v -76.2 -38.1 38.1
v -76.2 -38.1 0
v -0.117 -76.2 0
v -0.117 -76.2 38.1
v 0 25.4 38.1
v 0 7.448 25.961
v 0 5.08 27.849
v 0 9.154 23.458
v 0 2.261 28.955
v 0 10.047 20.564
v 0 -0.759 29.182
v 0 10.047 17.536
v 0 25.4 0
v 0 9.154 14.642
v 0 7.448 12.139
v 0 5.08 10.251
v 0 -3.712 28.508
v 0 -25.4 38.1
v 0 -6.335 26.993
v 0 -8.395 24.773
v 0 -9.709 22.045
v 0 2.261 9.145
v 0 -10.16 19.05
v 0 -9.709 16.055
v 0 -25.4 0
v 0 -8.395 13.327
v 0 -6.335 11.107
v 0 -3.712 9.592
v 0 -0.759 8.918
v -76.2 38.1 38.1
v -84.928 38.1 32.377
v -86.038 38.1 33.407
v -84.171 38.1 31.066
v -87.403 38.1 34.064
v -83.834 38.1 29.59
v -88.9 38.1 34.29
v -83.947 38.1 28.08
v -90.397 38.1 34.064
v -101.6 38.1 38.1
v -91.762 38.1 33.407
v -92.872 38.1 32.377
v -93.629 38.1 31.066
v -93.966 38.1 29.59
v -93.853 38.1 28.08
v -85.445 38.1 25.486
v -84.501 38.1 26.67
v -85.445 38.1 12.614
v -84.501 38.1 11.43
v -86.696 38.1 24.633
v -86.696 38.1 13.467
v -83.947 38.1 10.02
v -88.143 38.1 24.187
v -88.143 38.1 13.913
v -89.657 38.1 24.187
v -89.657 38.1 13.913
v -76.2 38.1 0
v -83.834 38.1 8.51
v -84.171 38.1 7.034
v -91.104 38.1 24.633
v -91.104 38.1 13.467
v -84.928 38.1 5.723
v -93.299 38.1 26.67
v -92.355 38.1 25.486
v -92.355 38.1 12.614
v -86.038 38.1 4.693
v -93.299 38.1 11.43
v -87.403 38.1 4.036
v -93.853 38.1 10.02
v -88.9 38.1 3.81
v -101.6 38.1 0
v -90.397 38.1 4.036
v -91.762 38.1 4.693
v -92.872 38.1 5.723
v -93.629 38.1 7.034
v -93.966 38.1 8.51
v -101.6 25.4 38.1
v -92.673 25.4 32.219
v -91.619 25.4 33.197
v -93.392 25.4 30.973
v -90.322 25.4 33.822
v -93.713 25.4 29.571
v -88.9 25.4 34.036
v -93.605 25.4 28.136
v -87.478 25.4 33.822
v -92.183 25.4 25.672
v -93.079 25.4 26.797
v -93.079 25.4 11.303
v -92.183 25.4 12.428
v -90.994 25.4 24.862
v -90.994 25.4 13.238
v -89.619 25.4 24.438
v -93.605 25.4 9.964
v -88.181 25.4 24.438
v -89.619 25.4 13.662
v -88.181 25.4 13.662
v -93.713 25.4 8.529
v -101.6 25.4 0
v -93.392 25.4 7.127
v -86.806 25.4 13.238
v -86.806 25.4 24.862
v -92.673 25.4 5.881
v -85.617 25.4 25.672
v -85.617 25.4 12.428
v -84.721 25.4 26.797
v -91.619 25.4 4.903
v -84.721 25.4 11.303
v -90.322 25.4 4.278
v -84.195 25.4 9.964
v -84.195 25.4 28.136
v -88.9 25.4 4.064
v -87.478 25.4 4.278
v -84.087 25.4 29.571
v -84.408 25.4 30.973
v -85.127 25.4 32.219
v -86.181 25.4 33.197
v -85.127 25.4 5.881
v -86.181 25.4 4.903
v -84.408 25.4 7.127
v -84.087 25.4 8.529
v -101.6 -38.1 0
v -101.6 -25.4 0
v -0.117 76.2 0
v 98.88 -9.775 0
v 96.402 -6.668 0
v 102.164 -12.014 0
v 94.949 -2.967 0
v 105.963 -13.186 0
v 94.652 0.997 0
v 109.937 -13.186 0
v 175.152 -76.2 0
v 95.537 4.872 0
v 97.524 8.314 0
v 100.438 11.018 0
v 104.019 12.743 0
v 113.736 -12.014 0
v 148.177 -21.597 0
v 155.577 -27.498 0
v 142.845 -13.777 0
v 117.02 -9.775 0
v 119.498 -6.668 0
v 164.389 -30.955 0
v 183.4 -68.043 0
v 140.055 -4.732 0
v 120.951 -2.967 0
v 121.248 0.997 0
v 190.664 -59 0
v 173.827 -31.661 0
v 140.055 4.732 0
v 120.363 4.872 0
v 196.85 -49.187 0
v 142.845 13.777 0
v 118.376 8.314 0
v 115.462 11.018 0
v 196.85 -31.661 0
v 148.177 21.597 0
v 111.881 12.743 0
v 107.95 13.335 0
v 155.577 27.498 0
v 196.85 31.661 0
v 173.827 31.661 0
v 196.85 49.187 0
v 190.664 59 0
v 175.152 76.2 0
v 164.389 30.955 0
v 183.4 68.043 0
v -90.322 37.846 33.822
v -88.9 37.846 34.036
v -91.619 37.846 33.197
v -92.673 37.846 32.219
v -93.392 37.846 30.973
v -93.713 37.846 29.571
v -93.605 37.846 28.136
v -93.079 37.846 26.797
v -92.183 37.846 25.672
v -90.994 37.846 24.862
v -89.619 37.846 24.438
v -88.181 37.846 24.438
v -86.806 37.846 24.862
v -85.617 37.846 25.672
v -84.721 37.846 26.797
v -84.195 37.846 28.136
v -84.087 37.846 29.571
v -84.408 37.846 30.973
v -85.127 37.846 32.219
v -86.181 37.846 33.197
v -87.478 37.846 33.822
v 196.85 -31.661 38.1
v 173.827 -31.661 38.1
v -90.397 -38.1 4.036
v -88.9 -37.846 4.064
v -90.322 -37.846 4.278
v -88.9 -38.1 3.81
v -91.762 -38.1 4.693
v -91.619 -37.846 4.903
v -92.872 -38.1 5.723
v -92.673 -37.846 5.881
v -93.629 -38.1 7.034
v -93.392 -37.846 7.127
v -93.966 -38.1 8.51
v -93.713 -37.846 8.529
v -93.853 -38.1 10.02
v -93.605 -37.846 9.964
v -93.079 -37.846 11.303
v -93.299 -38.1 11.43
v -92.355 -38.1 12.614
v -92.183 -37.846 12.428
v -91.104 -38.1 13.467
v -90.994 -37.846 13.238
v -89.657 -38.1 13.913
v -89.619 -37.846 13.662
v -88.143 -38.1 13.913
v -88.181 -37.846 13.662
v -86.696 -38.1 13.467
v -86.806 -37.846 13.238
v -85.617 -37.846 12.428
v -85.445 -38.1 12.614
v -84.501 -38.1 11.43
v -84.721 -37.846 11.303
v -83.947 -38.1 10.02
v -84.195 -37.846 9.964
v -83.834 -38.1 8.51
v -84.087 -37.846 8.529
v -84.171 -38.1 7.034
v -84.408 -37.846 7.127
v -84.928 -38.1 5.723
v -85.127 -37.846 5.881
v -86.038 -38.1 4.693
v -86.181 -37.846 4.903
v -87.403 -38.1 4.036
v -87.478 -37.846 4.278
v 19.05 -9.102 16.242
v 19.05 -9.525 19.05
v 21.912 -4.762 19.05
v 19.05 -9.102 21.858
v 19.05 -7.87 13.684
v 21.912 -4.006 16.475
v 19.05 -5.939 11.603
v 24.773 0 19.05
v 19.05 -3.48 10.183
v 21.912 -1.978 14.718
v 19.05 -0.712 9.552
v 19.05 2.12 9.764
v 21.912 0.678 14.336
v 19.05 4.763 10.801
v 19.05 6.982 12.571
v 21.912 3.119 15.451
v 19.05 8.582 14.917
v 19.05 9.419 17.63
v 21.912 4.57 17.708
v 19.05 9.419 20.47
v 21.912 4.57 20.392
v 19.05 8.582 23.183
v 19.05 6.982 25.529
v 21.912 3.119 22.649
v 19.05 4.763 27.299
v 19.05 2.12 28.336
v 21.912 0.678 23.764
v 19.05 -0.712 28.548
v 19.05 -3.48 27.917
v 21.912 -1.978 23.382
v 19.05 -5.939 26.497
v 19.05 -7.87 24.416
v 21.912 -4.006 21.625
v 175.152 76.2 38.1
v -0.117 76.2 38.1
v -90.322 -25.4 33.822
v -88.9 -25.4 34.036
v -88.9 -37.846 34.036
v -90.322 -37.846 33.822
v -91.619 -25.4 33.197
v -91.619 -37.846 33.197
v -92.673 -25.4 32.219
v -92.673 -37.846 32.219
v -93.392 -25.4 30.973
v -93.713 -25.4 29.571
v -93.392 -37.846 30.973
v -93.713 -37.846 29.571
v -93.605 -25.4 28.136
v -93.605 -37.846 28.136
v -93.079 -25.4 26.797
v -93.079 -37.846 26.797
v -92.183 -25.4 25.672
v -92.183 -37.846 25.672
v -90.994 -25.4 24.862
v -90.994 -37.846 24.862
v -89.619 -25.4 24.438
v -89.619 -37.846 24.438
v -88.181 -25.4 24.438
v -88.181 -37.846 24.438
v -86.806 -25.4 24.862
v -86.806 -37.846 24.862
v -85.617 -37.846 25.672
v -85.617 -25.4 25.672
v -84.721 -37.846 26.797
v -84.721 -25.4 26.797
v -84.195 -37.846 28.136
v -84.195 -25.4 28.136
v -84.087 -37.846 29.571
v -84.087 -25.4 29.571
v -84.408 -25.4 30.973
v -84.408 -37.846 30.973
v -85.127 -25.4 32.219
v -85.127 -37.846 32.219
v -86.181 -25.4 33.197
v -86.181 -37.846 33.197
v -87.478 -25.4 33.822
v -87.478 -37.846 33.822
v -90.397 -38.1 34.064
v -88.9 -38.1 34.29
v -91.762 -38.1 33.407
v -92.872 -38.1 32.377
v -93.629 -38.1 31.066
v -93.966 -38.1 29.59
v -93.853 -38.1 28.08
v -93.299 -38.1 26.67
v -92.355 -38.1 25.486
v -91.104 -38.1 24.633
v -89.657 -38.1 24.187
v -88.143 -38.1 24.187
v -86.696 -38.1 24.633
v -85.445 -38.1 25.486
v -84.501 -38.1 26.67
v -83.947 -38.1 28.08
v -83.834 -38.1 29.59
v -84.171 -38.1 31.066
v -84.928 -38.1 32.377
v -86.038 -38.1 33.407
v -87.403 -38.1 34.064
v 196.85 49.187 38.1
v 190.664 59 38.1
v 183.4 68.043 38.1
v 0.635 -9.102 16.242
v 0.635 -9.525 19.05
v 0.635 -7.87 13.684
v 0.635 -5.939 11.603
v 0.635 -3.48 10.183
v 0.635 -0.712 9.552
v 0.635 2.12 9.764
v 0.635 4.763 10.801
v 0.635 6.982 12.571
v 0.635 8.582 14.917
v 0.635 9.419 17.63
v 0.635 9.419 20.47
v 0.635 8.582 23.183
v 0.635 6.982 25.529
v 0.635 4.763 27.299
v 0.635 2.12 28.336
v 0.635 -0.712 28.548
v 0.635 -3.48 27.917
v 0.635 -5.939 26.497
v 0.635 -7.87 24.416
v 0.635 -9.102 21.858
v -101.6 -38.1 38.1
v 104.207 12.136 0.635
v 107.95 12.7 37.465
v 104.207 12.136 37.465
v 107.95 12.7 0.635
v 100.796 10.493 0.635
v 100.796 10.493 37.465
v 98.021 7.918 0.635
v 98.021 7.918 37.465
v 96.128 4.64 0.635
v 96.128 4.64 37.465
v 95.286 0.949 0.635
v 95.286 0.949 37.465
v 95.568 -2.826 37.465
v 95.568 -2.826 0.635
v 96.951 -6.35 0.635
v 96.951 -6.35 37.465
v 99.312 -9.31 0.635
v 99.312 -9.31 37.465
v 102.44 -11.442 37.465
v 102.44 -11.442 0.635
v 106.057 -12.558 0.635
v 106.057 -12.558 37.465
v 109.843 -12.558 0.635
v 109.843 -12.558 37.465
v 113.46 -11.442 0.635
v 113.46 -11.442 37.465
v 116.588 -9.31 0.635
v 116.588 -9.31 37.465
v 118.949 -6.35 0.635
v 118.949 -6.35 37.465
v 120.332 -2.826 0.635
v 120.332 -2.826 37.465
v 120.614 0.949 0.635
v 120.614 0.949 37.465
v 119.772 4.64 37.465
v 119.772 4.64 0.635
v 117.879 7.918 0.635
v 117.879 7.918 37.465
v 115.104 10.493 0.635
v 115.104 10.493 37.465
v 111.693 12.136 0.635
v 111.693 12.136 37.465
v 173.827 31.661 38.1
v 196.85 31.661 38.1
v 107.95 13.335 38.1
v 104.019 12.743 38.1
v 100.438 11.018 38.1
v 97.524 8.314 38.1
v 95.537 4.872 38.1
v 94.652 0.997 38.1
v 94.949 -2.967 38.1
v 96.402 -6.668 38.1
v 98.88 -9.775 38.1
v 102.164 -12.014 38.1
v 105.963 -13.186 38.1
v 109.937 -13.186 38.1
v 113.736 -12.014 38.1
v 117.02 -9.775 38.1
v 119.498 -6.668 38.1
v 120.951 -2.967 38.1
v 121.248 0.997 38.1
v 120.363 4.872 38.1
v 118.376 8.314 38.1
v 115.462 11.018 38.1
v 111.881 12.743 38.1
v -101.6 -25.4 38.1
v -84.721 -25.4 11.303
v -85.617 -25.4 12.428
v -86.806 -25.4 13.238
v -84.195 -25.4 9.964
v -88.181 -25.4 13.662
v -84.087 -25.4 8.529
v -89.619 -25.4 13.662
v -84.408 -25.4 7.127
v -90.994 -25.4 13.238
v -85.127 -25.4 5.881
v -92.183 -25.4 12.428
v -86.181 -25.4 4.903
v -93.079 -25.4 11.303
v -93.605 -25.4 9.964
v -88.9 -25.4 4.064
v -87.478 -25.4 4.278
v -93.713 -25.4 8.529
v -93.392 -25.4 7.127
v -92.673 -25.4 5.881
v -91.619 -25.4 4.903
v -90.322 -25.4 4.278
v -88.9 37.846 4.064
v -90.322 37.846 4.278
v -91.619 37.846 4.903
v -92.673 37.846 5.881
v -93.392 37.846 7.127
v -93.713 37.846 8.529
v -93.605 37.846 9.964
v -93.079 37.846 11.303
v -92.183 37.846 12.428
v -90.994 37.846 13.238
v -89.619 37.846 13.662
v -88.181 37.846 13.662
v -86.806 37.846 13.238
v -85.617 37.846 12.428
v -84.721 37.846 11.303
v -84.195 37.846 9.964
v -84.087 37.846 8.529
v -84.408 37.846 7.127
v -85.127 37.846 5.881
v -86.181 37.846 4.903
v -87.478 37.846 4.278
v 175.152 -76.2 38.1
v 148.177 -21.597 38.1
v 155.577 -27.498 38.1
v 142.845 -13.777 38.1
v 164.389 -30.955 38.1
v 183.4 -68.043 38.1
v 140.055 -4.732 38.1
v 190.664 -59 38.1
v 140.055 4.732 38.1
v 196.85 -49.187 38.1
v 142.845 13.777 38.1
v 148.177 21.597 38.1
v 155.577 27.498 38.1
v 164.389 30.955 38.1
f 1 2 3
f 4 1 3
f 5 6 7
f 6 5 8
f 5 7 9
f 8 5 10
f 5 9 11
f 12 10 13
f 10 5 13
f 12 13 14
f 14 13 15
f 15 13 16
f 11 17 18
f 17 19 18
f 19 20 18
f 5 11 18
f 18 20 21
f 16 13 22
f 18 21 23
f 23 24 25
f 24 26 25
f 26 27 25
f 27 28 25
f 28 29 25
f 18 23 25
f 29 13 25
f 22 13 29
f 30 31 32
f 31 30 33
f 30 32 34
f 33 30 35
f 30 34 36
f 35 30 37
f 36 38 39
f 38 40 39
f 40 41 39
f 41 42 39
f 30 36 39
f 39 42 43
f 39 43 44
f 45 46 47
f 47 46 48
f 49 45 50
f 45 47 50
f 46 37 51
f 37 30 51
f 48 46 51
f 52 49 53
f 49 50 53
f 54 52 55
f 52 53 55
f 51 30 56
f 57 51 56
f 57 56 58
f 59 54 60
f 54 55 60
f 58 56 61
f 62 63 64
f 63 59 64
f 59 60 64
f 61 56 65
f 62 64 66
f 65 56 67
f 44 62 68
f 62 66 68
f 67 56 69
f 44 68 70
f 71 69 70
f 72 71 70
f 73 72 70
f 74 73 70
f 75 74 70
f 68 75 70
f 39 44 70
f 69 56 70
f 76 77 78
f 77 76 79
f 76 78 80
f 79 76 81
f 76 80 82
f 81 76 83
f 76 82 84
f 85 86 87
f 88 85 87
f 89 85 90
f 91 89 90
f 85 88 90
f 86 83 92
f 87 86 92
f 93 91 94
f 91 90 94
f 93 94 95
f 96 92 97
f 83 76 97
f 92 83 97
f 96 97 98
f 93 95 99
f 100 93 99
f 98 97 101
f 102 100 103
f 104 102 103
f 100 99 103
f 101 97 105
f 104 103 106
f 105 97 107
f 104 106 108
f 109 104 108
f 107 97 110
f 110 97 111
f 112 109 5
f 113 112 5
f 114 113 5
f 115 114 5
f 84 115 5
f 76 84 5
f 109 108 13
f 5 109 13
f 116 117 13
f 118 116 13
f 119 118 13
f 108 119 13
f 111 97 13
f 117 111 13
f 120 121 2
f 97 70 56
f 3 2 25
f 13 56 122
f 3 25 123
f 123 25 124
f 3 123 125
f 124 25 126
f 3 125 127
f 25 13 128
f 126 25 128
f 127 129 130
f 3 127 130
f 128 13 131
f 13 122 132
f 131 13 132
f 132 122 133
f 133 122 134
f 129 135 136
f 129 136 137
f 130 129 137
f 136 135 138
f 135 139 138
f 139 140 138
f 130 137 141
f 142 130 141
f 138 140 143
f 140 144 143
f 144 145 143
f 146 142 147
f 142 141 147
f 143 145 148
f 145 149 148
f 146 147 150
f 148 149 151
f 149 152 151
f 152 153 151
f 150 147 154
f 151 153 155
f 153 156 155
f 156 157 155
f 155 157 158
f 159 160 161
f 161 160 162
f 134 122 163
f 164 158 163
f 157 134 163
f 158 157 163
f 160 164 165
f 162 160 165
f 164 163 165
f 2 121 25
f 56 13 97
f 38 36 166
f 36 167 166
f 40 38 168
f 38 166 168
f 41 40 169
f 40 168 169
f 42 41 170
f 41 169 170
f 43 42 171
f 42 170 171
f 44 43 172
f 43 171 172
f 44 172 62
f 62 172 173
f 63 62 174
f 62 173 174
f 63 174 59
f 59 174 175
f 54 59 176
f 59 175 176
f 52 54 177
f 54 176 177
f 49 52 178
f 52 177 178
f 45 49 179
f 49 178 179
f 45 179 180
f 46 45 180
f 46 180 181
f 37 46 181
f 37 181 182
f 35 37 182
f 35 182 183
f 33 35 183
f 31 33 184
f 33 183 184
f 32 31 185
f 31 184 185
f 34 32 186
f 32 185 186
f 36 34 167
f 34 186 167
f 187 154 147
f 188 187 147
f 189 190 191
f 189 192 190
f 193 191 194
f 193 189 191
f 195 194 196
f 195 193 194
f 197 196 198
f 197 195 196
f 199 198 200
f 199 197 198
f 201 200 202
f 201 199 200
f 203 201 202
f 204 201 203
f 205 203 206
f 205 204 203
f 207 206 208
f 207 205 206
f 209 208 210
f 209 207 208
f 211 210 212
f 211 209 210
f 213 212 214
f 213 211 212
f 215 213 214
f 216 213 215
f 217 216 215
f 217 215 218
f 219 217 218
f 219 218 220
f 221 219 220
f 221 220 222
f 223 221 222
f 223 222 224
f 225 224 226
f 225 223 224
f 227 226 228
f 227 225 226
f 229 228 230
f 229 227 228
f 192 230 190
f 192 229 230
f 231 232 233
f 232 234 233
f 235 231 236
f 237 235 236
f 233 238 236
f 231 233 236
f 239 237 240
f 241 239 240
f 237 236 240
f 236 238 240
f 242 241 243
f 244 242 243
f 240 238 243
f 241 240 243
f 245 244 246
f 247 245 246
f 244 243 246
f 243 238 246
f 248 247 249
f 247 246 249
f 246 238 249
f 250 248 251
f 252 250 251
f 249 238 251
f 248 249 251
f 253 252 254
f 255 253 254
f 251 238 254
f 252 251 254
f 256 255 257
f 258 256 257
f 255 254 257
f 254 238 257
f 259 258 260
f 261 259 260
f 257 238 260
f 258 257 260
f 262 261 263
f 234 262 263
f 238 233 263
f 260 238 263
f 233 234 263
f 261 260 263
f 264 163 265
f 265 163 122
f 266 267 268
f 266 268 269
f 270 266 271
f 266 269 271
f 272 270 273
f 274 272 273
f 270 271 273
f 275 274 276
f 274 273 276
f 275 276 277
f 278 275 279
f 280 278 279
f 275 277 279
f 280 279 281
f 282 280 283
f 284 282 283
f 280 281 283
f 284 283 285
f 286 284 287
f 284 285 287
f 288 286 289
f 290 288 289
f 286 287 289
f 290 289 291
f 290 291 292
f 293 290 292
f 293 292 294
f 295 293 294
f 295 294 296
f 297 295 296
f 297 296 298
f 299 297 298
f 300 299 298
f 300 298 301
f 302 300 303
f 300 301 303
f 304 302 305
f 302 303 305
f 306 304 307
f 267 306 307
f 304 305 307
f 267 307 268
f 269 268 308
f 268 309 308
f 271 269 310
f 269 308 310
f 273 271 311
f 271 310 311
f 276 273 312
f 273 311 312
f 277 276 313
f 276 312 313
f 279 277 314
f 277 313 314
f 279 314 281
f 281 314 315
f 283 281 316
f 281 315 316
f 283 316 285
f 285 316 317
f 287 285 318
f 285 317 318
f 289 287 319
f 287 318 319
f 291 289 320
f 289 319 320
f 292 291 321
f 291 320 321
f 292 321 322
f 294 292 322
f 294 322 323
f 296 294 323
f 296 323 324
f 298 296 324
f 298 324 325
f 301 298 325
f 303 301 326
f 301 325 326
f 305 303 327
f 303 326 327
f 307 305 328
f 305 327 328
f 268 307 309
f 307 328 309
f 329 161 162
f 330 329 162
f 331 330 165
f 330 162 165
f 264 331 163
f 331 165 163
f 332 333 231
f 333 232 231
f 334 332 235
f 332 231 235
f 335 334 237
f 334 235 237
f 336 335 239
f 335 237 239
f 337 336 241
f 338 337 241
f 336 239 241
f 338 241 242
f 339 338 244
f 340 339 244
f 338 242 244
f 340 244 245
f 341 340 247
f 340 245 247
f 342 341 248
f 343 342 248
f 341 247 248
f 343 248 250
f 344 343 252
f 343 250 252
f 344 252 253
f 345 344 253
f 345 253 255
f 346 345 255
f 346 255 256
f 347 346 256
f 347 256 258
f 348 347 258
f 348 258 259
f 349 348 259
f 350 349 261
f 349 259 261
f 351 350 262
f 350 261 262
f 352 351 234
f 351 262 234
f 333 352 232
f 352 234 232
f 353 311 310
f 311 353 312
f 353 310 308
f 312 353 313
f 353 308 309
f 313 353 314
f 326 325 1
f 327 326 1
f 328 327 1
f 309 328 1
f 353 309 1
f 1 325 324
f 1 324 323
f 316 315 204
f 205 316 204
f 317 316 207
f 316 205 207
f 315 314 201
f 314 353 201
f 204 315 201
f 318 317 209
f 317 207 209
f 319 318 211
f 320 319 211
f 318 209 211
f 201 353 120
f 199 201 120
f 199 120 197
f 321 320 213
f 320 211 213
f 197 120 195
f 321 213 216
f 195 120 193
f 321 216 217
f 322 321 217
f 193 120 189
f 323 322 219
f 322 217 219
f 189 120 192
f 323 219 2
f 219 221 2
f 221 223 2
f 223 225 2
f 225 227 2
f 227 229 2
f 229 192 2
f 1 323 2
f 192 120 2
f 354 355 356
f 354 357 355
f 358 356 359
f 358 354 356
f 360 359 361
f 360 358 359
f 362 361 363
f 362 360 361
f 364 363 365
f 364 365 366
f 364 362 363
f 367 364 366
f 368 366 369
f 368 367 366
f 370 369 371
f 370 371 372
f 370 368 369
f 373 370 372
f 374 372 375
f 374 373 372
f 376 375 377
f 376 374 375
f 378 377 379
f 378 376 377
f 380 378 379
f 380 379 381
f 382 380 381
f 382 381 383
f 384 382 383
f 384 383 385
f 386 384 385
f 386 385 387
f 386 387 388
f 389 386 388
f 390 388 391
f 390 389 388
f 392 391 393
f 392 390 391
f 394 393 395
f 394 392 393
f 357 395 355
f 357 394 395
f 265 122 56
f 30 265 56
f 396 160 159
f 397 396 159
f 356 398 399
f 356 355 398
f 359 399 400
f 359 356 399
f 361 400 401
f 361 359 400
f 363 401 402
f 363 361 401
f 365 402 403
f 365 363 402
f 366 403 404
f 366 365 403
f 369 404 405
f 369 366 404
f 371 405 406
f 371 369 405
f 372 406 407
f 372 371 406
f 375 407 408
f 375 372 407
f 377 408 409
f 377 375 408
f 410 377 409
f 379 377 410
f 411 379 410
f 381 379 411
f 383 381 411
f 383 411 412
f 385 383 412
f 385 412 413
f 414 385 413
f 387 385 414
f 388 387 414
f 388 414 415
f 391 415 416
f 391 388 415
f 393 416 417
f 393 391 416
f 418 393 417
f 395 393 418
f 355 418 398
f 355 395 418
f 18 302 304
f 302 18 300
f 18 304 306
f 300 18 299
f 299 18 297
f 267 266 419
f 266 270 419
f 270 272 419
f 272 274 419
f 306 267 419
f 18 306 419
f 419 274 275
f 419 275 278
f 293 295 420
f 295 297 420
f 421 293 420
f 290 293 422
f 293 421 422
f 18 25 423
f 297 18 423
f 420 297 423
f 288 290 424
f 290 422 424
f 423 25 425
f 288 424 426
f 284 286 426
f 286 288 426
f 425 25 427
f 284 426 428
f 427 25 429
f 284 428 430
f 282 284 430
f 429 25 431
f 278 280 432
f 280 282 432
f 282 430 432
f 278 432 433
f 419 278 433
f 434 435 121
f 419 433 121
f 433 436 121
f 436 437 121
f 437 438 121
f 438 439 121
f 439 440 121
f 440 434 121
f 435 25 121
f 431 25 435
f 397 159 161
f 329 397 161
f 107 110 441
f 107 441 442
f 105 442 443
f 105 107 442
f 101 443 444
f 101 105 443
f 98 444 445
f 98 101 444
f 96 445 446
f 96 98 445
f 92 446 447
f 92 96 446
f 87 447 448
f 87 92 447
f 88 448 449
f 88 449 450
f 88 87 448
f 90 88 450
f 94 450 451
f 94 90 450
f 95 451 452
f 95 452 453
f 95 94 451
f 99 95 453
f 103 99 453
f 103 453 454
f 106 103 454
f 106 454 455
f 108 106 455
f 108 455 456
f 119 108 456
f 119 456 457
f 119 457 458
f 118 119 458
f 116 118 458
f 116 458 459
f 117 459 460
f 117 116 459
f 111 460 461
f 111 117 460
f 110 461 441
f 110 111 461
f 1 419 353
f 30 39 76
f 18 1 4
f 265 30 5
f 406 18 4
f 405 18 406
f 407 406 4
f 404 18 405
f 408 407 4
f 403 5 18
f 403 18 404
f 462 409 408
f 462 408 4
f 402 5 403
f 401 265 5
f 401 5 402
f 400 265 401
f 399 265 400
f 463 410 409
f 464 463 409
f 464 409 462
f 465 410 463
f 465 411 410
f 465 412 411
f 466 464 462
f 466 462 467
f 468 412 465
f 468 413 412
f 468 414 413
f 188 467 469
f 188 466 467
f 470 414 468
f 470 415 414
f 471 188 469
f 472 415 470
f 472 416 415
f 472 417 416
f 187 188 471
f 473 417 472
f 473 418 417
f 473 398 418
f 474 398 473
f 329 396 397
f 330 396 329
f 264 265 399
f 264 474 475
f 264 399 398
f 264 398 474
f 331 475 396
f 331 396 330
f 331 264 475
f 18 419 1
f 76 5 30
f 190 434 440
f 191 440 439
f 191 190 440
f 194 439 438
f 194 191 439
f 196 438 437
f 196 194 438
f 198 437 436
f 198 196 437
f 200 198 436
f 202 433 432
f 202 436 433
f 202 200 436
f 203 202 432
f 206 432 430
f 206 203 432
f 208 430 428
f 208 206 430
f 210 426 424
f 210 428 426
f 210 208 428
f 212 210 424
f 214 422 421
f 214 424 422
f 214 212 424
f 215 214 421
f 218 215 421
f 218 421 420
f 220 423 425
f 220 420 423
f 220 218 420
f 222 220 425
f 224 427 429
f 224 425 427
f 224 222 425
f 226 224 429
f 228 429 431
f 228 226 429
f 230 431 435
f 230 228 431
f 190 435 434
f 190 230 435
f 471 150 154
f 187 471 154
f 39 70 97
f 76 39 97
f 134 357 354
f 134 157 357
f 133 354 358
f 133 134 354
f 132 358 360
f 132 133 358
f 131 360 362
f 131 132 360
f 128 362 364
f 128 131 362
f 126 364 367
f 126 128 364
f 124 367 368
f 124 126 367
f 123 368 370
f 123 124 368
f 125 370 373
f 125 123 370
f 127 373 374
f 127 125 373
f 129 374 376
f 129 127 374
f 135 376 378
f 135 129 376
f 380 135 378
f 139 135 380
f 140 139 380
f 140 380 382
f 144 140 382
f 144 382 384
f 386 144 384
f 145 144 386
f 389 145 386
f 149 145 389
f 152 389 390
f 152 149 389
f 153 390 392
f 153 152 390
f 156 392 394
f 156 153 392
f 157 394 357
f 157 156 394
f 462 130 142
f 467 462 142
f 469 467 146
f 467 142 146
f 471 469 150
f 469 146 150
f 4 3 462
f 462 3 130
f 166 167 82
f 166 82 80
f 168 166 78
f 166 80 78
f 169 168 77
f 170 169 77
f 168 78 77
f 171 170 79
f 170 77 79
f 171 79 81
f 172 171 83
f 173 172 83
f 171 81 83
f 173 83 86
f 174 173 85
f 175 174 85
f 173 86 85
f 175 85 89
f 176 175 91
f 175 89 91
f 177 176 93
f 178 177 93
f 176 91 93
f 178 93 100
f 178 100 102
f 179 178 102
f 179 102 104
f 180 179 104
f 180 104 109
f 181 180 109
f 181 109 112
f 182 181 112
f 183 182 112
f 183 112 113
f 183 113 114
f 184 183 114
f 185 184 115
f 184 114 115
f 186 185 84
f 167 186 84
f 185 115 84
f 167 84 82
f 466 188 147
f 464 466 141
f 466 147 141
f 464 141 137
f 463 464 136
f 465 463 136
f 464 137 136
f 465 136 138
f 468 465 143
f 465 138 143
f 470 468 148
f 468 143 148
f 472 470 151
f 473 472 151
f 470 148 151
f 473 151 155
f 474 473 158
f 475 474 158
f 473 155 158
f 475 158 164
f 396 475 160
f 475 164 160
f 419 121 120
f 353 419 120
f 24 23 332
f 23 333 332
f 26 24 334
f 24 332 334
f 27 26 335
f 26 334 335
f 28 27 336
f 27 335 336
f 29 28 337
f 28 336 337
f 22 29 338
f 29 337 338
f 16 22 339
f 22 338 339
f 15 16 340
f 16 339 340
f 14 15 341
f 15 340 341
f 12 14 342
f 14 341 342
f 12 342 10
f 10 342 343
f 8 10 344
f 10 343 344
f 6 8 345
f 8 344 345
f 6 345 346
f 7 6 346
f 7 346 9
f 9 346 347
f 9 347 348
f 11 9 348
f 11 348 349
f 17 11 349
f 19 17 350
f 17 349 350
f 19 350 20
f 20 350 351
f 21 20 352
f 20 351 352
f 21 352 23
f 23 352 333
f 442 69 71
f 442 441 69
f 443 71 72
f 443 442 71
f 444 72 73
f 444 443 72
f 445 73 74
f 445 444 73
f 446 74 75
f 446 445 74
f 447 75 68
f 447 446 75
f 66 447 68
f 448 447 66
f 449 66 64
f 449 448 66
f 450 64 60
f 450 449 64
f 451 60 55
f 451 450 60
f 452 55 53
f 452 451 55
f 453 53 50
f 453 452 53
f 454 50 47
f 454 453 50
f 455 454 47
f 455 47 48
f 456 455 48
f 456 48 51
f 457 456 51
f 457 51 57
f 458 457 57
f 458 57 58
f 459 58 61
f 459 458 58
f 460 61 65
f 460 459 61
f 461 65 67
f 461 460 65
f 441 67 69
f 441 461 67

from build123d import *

# Parameters (mm, degrees)
F1_DEPTH = 38.1


# Not quite as in the source:
# - a pattern or mirror of a feature is missing from the dataset's text; its kind, count and spacing are read off the source's solid


with BuildPart() as f1:
    # F0 (on Top) → F1 (new body)
    with BuildSketch(Plane.XY):
        with BuildLine():
            Line((0, 25.4), (0, 0))
            Line((0, 0), (0, -25.4))
            Line((0, -25.4), (-101.6, -25.4))
            Line((-101.6, -25.4), (-101.6, -38.1))
            Line((-101.6, -38.1), (-76.2, -38.1))
            Line((-76.2, -38.1), (-0.1165057322, -76.2))
            Line((-0.1165057322, -76.2), (175.152083301, -76.2))
            ThreePointArc((175.152083301, -76.2), (187.161060787, -63.6252139407), (196.85, -49.1868884968))
            Line((196.85, -49.1868884968), (196.85, -31.6608884968))
            Line((196.85, -31.6608884968), (173.8271074, -31.6608884968))
            ThreePointArc((173.8271074, -31.6608884968), (139.7, 0), (173.8271074, 31.6608884968))
            Line((173.8271074, 31.6608884968), (196.85, 31.6608884968))
            Line((196.85, 31.6608884968), (196.85, 49.1868884968))
            ThreePointArc((196.85, 49.1868884968), (187.161060787, 63.6252139407), (175.152083301, 76.2))
            Line((175.152083301, 76.2), (-0.1165057322, 76.2))
            Line((-0.1165057322, 76.2), (-76.2, 38.1))
            Line((-76.2, 38.1), (-101.6, 38.1))
            Line((-101.6, 38.1), (-101.6, 25.4))
            Line((-101.6, 25.4), (0, 25.4))
        make_face()
    extrude(amount=F1_DEPTH)

    # F3 (on offset) → F4 (revolve, cut)
    with BuildSketch(Plane(origin=(107.95, 0, 0), x_dir=(0, -1, 0), z_dir=(-1, 0, 0))):
        Polygon((-13.335, 0), (0, 0), (0, 38.1), (-13.335, 38.1), (-12.7, 37.465), (-12.7, 0.635), align=None)
    revolve(axis=Axis((107.95, 0, 19.05), (0, 0, 1)), mode=Mode.SUBTRACT)

    # F6 (on mid) → F7 (revolve, cut)
    with BuildSketch(Plane.XY.offset(19.05)):
        Polygon((24.7731973962, 0), (0, 0), (0, -10.16), (0.635, -9.525), (19.05, -9.525), align=None)
    revolve(axis=Axis((12.3865986981, 0, 19.05), (1, 0, 0)), mode=Mode.SUBTRACT)

    # F9 (on offset) → F10 (revolve, cut)
    with BuildSketch(Plane(origin=(-88.9, 0, 0), x_dir=(0, -1, 0), z_dir=(-1, 0, 0))):
        Polygon((38.1, 8.89), (-38.1, 8.89), (-38.1, 3.81), (-37.846, 4.064), (37.846, 4.064), (38.1, 3.81), align=None)
    f10 = revolve(axis=Axis((-88.9, 0, 8.89), (0, 1, 0)), mode=Mode.SUBTRACT)

    # F10_copies: F10 across plane
    add(f10.mirror(Plane.XY.offset(19.05)), mode=Mode.SUBTRACT)


solid = f1.part
